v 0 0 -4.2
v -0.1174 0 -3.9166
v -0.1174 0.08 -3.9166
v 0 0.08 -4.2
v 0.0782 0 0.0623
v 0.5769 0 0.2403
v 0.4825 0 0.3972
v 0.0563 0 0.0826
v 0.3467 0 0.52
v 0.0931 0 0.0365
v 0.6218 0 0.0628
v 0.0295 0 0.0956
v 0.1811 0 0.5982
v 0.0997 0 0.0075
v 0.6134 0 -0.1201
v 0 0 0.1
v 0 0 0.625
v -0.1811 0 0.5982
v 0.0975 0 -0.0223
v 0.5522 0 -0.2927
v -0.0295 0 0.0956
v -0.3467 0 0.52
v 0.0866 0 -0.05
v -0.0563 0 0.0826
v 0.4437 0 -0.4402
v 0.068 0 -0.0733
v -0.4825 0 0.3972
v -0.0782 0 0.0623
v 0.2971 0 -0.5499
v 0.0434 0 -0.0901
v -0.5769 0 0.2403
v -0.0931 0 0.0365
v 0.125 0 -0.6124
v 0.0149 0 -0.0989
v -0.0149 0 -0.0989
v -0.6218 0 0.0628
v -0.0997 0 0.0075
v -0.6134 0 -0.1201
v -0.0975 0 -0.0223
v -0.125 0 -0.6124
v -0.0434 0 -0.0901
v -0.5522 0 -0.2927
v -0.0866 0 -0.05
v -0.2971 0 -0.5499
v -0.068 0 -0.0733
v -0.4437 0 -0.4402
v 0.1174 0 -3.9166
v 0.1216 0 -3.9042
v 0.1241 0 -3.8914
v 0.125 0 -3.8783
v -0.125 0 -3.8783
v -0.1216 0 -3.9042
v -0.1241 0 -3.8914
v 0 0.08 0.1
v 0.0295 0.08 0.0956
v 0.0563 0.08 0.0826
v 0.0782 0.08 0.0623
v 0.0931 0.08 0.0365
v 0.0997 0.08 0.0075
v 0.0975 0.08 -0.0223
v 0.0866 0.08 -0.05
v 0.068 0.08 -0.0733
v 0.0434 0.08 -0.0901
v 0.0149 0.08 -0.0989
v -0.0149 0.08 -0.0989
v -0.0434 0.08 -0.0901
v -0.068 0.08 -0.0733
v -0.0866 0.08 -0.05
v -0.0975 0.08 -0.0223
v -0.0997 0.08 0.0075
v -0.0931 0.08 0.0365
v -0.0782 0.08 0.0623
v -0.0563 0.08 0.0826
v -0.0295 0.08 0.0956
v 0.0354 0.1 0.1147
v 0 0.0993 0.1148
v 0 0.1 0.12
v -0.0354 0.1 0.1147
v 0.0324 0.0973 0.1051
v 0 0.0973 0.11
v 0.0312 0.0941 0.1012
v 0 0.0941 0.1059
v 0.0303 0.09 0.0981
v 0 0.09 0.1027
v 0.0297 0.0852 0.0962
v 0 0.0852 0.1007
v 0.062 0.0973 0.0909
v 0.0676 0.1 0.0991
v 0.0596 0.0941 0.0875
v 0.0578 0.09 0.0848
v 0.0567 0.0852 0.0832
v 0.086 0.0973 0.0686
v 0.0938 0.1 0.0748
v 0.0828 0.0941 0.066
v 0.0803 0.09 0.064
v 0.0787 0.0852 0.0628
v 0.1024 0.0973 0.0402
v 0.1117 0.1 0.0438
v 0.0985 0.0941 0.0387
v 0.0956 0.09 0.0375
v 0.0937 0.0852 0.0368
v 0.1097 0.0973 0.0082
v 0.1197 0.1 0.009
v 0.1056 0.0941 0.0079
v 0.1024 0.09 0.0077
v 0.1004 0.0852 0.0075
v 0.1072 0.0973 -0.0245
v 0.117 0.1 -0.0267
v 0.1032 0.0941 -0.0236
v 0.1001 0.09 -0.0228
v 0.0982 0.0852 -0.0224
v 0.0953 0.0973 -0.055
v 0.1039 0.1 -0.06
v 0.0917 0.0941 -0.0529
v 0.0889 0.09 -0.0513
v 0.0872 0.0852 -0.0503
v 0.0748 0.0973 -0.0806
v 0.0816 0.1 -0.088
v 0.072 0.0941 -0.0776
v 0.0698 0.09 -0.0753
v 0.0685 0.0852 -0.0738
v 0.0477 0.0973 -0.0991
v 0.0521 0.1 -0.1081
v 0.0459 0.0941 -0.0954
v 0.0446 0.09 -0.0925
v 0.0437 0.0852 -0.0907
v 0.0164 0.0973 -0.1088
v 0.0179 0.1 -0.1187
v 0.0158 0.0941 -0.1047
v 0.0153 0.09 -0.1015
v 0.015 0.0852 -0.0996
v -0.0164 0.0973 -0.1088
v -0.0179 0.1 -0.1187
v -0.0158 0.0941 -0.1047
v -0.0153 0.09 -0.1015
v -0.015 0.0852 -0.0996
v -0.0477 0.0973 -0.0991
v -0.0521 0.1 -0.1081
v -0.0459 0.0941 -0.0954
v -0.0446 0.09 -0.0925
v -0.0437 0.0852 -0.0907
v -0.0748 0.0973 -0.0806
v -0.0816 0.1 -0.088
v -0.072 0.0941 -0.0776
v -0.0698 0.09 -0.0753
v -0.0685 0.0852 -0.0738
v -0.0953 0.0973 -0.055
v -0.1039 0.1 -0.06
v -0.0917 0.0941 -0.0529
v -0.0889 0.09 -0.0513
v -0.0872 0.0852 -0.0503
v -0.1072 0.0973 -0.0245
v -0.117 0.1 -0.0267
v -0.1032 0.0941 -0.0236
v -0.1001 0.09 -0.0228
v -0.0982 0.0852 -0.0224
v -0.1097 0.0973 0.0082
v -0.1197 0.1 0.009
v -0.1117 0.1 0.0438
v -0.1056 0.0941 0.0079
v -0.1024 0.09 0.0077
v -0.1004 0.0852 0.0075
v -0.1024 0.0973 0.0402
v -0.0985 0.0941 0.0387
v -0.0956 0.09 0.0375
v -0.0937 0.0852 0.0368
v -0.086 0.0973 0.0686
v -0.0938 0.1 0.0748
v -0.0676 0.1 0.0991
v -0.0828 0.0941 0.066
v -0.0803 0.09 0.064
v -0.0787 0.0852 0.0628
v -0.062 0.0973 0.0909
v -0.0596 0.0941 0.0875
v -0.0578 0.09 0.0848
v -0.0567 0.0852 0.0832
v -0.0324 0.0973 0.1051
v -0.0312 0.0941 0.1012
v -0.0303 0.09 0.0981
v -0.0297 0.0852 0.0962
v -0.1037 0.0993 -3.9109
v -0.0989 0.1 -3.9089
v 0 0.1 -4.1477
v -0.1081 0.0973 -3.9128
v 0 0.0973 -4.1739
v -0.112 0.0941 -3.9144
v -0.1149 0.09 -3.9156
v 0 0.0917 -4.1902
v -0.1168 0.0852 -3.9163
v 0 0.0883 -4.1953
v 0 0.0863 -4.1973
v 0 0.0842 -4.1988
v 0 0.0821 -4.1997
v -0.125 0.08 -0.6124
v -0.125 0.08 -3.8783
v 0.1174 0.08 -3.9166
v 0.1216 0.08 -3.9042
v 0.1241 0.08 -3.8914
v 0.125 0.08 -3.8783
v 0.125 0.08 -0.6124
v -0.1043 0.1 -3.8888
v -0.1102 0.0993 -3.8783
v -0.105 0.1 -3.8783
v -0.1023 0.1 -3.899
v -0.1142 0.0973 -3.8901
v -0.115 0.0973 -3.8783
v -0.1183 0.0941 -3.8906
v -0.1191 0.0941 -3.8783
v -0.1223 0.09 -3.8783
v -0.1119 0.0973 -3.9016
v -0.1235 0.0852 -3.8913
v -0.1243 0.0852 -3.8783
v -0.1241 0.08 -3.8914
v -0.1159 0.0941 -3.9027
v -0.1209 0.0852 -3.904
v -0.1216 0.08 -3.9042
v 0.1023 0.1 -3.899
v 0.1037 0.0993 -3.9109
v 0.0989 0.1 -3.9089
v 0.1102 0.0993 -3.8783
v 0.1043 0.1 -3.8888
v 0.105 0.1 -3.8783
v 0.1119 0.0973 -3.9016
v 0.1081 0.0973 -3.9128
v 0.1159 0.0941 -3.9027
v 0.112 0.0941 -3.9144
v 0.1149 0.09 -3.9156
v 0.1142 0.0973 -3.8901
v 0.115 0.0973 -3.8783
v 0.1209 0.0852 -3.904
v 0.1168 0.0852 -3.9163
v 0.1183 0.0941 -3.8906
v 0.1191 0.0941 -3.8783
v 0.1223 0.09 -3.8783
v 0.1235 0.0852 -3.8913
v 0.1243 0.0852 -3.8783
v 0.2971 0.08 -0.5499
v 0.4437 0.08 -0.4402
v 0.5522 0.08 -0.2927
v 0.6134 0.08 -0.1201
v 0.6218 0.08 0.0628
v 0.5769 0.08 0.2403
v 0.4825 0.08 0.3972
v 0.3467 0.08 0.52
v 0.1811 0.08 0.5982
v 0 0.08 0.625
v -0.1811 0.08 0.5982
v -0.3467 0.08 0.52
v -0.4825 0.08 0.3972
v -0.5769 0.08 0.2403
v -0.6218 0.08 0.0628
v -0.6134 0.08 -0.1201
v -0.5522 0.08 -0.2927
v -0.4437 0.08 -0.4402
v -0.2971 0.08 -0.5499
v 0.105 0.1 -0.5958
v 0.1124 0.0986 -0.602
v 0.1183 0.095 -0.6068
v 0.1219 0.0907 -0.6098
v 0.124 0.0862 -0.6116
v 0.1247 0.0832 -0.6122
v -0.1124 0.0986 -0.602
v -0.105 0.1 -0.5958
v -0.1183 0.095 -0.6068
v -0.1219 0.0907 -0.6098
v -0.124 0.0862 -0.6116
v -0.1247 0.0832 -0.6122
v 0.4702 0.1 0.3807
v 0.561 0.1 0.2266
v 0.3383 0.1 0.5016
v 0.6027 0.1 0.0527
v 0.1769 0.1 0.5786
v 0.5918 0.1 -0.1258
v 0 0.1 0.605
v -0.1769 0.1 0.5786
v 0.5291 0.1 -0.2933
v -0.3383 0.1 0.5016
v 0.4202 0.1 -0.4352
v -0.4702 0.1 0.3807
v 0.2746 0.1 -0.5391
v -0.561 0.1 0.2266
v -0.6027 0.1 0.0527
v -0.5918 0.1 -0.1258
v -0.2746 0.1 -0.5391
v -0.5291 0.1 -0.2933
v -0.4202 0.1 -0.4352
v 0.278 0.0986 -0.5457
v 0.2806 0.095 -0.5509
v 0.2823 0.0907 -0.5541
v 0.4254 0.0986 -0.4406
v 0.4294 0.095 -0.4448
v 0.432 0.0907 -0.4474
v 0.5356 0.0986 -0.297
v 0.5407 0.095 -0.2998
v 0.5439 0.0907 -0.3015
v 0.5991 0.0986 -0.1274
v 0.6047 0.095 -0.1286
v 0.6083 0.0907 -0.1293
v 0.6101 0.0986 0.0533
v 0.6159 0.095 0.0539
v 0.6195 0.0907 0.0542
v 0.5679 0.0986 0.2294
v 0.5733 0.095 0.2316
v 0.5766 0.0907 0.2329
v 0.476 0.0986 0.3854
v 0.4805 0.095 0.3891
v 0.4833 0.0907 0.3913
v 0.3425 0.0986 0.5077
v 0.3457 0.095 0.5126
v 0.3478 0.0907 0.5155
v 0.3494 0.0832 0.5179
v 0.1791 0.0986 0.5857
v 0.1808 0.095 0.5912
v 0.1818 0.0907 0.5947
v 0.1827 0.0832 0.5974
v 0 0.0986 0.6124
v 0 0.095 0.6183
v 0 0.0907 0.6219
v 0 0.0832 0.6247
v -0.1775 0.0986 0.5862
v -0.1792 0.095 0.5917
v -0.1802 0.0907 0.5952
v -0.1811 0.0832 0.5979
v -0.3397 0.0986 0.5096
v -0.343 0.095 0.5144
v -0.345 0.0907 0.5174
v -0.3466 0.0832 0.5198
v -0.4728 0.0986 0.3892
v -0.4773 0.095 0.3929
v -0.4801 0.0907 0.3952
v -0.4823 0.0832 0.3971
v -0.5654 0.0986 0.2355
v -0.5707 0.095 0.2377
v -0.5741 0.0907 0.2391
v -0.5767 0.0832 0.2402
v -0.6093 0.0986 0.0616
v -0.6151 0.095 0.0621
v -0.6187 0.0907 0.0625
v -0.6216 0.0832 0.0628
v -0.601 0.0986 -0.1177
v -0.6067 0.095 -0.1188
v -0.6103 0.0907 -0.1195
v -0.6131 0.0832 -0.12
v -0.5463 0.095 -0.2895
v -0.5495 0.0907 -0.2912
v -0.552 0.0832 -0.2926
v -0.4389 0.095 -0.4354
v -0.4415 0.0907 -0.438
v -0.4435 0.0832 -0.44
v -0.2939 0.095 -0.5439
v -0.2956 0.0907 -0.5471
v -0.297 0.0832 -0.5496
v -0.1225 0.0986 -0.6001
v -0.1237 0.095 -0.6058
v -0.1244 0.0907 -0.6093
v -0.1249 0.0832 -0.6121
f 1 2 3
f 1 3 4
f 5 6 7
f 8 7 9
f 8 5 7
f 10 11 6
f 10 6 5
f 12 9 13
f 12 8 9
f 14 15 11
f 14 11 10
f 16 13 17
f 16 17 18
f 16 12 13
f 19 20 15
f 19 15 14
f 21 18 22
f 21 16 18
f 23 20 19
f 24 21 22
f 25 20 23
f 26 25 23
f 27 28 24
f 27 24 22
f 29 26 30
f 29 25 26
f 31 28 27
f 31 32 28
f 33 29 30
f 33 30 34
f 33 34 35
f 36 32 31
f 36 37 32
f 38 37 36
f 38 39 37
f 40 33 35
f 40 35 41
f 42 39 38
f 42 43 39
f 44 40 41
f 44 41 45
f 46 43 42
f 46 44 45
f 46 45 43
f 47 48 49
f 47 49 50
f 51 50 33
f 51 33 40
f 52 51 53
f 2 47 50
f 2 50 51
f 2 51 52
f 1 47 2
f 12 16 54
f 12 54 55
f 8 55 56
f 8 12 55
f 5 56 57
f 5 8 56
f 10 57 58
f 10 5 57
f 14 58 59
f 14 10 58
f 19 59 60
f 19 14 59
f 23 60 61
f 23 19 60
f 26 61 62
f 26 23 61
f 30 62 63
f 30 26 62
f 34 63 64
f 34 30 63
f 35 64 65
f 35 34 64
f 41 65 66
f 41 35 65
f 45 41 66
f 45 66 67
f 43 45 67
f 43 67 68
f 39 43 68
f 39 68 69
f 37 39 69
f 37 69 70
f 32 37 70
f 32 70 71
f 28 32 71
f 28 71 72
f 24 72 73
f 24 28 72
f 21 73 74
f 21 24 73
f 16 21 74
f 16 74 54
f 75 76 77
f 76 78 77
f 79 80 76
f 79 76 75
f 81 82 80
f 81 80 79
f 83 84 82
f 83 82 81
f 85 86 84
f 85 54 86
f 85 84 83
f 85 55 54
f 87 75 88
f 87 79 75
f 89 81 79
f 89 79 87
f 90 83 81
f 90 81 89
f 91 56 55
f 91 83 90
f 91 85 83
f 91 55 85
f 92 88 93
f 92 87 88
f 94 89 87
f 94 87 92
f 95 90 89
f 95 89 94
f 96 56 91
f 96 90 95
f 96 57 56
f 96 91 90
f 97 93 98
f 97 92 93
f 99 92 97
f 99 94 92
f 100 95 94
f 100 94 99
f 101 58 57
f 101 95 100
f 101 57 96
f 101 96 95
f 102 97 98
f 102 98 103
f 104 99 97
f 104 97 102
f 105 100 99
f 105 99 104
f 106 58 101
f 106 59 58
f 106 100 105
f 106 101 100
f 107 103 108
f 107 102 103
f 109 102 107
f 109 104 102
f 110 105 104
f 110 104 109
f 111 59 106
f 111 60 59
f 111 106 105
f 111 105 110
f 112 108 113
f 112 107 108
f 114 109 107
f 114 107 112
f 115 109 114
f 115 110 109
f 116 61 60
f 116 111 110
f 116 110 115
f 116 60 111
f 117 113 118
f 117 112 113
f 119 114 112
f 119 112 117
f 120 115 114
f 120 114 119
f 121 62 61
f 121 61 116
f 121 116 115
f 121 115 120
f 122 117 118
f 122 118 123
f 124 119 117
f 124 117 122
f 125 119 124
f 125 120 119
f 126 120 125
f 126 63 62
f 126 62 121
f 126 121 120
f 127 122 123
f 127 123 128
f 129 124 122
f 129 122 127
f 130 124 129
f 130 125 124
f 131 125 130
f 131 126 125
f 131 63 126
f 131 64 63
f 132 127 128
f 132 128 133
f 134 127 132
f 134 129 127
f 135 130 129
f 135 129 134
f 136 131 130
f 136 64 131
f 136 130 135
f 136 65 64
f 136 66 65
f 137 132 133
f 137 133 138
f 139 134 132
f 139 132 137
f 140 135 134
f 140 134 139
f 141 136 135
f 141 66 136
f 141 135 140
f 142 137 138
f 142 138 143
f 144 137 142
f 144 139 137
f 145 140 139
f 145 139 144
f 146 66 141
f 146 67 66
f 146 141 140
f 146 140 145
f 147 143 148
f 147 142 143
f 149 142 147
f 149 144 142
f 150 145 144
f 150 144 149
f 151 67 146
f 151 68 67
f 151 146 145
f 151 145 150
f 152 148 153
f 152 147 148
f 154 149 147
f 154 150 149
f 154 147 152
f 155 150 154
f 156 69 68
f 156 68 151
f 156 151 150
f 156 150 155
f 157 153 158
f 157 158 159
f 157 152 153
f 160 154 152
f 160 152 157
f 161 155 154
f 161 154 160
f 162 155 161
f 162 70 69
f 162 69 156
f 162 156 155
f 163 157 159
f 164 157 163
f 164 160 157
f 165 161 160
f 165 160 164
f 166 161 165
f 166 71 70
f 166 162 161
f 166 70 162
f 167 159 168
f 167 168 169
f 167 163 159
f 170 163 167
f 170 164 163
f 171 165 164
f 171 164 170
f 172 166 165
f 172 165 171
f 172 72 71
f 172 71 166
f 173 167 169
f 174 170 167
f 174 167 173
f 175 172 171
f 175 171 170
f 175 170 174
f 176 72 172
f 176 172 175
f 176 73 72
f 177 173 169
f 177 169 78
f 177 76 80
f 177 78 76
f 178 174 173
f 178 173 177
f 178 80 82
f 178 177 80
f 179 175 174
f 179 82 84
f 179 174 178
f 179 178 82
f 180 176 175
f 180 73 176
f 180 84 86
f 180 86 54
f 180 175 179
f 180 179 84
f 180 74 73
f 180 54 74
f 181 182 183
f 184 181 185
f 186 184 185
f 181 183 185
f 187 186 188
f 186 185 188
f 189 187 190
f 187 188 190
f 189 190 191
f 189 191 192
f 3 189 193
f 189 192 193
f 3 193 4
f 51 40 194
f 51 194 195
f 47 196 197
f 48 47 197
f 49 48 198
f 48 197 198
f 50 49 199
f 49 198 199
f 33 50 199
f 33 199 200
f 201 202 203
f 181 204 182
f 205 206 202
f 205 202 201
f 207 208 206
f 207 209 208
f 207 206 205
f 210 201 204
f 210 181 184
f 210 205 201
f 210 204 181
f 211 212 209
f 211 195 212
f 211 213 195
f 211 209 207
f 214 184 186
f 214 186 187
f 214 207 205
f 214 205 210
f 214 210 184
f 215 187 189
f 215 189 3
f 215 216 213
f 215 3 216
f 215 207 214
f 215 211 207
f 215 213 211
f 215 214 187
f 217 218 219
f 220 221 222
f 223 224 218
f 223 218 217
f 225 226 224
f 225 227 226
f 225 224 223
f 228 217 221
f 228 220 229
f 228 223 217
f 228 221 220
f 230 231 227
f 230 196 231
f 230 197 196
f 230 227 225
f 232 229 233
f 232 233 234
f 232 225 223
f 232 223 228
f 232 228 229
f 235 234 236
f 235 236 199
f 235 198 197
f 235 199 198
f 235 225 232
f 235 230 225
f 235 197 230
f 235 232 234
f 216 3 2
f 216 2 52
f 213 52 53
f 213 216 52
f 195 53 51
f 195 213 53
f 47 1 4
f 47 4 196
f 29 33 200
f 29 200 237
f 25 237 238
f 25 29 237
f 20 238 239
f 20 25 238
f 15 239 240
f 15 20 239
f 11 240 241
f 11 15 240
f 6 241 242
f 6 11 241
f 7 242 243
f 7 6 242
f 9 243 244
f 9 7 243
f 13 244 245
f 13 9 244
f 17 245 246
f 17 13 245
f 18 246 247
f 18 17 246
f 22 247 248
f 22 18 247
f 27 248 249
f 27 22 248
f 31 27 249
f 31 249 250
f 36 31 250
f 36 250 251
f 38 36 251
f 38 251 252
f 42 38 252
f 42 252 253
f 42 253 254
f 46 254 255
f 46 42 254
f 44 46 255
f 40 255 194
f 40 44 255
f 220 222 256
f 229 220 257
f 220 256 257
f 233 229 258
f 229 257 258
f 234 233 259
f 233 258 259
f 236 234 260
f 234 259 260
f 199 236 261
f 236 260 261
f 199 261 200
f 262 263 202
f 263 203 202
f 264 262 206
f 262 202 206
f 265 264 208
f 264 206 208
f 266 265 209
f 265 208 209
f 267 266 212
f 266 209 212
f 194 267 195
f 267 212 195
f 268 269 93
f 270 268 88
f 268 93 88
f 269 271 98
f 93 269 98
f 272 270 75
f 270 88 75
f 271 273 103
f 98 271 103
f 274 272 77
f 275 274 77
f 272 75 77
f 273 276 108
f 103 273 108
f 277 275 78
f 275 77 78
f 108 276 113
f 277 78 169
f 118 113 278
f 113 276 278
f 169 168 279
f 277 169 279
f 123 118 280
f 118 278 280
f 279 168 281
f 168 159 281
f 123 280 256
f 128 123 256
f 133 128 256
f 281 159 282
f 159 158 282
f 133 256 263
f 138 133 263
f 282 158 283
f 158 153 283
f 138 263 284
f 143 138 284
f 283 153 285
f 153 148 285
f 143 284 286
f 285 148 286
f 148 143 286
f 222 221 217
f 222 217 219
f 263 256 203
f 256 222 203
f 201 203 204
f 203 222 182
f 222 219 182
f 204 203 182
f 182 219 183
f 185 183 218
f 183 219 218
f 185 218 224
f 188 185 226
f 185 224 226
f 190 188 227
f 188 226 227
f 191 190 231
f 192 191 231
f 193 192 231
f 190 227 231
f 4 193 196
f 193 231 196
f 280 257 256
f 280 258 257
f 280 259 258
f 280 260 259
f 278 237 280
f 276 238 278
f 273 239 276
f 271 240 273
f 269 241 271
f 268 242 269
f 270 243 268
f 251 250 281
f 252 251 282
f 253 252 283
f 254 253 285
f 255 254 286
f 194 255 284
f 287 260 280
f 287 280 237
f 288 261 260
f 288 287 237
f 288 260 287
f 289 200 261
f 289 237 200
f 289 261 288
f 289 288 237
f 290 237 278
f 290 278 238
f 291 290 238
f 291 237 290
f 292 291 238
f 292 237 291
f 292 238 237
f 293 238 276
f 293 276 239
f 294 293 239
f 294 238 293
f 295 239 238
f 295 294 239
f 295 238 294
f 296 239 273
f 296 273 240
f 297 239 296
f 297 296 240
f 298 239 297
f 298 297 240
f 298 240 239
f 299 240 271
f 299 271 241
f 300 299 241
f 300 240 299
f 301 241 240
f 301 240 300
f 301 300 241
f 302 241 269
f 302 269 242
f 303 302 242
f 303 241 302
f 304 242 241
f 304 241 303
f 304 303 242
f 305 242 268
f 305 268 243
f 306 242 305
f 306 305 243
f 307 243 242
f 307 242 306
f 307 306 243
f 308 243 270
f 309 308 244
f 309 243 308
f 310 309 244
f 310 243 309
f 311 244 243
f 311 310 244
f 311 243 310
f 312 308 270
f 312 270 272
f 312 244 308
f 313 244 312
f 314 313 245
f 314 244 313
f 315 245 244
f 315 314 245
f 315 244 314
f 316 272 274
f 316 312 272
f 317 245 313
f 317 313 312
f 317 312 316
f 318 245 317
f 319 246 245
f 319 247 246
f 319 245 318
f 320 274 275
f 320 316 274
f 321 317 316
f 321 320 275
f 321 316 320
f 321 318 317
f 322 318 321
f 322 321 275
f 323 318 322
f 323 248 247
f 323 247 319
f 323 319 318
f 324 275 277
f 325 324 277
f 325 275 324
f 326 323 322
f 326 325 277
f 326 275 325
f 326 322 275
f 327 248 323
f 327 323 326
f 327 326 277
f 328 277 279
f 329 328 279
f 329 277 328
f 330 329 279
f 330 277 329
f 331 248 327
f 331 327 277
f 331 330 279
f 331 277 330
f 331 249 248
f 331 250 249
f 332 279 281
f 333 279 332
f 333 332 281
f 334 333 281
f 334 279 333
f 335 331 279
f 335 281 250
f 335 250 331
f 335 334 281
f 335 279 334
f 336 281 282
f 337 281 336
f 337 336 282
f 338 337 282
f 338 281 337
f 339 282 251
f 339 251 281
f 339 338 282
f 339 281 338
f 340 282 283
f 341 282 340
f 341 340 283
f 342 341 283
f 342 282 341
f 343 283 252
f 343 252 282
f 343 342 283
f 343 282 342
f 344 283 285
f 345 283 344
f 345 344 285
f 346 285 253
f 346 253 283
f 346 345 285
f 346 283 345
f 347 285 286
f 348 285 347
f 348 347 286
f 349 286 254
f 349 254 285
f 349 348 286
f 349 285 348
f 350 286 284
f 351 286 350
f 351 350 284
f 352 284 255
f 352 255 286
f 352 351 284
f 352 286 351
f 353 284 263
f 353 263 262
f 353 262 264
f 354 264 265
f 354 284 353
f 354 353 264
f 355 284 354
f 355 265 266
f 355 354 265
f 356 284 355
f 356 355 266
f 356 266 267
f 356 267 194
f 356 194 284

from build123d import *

# Parameters (mm, degrees)
SKETCH_1_R      = 0.1
EXTRUDE_1_DEPTH = 0.1
FILLET_1_R      = 0.1
FILLET_2_R      = 0.02


with BuildPart() as part:
    # 草图1 → 凸台-拉伸1 (new body)
    with BuildSketch(Plane(origin=(0, 0, 0), x_dir=(1, 0, 0), z_dir=(0, 1, 0))):
        with BuildLine():
            Line((-0.125, 3.898223305), (0, 4.2))
            Line((0, 4.2), (0.125, 3.898223305))
            Line((0.125, 3.898223305), (0.125, 0.612372436))
            ThreePointArc((0.125, 0.612372436), (0, -0.625), (-0.125, 0.612372436))
            Line((-0.125, 0.612372436), (-0.125, 3.898223305))
        make_face()
        with Locations(Location((0, 0, 0), (0, 0, 270))):
            Circle(SKETCH_1_R, mode=Mode.SUBTRACT)
    extrude(amount=EXTRUDE_1_DEPTH)

    # 圆角1
    fillet_1_edges = [part.edges().sort_by_distance(p)[0] for p in [
        (0.125, 0.05, -3.898223305),
        (-0.125, 0.05, -3.898223305),
    ]]
    fillet(fillet_1_edges, radius=FILLET_1_R)

    # 圆角2
    fillet_2_edges = [part.edges().sort_by_distance(p)[0] for p in [
        (-0.125, 0.1, -2.245352252),
        (-0.123078528, 0.1, -3.8978411),
        (0, 0.1, 0.625),
        (-0.058693977, 0.1, -4.058300206),
        (0.125, 0.1, -2.245352252),
        (0.058693977, 0.1, -4.058300206),
        (0.123078528, 0.1, -3.8978411),
        (0, 0.1, -0.1),
    ]]
    fillet(fillet_2_edges, radius=FILLET_2_R)


solid = part.part
